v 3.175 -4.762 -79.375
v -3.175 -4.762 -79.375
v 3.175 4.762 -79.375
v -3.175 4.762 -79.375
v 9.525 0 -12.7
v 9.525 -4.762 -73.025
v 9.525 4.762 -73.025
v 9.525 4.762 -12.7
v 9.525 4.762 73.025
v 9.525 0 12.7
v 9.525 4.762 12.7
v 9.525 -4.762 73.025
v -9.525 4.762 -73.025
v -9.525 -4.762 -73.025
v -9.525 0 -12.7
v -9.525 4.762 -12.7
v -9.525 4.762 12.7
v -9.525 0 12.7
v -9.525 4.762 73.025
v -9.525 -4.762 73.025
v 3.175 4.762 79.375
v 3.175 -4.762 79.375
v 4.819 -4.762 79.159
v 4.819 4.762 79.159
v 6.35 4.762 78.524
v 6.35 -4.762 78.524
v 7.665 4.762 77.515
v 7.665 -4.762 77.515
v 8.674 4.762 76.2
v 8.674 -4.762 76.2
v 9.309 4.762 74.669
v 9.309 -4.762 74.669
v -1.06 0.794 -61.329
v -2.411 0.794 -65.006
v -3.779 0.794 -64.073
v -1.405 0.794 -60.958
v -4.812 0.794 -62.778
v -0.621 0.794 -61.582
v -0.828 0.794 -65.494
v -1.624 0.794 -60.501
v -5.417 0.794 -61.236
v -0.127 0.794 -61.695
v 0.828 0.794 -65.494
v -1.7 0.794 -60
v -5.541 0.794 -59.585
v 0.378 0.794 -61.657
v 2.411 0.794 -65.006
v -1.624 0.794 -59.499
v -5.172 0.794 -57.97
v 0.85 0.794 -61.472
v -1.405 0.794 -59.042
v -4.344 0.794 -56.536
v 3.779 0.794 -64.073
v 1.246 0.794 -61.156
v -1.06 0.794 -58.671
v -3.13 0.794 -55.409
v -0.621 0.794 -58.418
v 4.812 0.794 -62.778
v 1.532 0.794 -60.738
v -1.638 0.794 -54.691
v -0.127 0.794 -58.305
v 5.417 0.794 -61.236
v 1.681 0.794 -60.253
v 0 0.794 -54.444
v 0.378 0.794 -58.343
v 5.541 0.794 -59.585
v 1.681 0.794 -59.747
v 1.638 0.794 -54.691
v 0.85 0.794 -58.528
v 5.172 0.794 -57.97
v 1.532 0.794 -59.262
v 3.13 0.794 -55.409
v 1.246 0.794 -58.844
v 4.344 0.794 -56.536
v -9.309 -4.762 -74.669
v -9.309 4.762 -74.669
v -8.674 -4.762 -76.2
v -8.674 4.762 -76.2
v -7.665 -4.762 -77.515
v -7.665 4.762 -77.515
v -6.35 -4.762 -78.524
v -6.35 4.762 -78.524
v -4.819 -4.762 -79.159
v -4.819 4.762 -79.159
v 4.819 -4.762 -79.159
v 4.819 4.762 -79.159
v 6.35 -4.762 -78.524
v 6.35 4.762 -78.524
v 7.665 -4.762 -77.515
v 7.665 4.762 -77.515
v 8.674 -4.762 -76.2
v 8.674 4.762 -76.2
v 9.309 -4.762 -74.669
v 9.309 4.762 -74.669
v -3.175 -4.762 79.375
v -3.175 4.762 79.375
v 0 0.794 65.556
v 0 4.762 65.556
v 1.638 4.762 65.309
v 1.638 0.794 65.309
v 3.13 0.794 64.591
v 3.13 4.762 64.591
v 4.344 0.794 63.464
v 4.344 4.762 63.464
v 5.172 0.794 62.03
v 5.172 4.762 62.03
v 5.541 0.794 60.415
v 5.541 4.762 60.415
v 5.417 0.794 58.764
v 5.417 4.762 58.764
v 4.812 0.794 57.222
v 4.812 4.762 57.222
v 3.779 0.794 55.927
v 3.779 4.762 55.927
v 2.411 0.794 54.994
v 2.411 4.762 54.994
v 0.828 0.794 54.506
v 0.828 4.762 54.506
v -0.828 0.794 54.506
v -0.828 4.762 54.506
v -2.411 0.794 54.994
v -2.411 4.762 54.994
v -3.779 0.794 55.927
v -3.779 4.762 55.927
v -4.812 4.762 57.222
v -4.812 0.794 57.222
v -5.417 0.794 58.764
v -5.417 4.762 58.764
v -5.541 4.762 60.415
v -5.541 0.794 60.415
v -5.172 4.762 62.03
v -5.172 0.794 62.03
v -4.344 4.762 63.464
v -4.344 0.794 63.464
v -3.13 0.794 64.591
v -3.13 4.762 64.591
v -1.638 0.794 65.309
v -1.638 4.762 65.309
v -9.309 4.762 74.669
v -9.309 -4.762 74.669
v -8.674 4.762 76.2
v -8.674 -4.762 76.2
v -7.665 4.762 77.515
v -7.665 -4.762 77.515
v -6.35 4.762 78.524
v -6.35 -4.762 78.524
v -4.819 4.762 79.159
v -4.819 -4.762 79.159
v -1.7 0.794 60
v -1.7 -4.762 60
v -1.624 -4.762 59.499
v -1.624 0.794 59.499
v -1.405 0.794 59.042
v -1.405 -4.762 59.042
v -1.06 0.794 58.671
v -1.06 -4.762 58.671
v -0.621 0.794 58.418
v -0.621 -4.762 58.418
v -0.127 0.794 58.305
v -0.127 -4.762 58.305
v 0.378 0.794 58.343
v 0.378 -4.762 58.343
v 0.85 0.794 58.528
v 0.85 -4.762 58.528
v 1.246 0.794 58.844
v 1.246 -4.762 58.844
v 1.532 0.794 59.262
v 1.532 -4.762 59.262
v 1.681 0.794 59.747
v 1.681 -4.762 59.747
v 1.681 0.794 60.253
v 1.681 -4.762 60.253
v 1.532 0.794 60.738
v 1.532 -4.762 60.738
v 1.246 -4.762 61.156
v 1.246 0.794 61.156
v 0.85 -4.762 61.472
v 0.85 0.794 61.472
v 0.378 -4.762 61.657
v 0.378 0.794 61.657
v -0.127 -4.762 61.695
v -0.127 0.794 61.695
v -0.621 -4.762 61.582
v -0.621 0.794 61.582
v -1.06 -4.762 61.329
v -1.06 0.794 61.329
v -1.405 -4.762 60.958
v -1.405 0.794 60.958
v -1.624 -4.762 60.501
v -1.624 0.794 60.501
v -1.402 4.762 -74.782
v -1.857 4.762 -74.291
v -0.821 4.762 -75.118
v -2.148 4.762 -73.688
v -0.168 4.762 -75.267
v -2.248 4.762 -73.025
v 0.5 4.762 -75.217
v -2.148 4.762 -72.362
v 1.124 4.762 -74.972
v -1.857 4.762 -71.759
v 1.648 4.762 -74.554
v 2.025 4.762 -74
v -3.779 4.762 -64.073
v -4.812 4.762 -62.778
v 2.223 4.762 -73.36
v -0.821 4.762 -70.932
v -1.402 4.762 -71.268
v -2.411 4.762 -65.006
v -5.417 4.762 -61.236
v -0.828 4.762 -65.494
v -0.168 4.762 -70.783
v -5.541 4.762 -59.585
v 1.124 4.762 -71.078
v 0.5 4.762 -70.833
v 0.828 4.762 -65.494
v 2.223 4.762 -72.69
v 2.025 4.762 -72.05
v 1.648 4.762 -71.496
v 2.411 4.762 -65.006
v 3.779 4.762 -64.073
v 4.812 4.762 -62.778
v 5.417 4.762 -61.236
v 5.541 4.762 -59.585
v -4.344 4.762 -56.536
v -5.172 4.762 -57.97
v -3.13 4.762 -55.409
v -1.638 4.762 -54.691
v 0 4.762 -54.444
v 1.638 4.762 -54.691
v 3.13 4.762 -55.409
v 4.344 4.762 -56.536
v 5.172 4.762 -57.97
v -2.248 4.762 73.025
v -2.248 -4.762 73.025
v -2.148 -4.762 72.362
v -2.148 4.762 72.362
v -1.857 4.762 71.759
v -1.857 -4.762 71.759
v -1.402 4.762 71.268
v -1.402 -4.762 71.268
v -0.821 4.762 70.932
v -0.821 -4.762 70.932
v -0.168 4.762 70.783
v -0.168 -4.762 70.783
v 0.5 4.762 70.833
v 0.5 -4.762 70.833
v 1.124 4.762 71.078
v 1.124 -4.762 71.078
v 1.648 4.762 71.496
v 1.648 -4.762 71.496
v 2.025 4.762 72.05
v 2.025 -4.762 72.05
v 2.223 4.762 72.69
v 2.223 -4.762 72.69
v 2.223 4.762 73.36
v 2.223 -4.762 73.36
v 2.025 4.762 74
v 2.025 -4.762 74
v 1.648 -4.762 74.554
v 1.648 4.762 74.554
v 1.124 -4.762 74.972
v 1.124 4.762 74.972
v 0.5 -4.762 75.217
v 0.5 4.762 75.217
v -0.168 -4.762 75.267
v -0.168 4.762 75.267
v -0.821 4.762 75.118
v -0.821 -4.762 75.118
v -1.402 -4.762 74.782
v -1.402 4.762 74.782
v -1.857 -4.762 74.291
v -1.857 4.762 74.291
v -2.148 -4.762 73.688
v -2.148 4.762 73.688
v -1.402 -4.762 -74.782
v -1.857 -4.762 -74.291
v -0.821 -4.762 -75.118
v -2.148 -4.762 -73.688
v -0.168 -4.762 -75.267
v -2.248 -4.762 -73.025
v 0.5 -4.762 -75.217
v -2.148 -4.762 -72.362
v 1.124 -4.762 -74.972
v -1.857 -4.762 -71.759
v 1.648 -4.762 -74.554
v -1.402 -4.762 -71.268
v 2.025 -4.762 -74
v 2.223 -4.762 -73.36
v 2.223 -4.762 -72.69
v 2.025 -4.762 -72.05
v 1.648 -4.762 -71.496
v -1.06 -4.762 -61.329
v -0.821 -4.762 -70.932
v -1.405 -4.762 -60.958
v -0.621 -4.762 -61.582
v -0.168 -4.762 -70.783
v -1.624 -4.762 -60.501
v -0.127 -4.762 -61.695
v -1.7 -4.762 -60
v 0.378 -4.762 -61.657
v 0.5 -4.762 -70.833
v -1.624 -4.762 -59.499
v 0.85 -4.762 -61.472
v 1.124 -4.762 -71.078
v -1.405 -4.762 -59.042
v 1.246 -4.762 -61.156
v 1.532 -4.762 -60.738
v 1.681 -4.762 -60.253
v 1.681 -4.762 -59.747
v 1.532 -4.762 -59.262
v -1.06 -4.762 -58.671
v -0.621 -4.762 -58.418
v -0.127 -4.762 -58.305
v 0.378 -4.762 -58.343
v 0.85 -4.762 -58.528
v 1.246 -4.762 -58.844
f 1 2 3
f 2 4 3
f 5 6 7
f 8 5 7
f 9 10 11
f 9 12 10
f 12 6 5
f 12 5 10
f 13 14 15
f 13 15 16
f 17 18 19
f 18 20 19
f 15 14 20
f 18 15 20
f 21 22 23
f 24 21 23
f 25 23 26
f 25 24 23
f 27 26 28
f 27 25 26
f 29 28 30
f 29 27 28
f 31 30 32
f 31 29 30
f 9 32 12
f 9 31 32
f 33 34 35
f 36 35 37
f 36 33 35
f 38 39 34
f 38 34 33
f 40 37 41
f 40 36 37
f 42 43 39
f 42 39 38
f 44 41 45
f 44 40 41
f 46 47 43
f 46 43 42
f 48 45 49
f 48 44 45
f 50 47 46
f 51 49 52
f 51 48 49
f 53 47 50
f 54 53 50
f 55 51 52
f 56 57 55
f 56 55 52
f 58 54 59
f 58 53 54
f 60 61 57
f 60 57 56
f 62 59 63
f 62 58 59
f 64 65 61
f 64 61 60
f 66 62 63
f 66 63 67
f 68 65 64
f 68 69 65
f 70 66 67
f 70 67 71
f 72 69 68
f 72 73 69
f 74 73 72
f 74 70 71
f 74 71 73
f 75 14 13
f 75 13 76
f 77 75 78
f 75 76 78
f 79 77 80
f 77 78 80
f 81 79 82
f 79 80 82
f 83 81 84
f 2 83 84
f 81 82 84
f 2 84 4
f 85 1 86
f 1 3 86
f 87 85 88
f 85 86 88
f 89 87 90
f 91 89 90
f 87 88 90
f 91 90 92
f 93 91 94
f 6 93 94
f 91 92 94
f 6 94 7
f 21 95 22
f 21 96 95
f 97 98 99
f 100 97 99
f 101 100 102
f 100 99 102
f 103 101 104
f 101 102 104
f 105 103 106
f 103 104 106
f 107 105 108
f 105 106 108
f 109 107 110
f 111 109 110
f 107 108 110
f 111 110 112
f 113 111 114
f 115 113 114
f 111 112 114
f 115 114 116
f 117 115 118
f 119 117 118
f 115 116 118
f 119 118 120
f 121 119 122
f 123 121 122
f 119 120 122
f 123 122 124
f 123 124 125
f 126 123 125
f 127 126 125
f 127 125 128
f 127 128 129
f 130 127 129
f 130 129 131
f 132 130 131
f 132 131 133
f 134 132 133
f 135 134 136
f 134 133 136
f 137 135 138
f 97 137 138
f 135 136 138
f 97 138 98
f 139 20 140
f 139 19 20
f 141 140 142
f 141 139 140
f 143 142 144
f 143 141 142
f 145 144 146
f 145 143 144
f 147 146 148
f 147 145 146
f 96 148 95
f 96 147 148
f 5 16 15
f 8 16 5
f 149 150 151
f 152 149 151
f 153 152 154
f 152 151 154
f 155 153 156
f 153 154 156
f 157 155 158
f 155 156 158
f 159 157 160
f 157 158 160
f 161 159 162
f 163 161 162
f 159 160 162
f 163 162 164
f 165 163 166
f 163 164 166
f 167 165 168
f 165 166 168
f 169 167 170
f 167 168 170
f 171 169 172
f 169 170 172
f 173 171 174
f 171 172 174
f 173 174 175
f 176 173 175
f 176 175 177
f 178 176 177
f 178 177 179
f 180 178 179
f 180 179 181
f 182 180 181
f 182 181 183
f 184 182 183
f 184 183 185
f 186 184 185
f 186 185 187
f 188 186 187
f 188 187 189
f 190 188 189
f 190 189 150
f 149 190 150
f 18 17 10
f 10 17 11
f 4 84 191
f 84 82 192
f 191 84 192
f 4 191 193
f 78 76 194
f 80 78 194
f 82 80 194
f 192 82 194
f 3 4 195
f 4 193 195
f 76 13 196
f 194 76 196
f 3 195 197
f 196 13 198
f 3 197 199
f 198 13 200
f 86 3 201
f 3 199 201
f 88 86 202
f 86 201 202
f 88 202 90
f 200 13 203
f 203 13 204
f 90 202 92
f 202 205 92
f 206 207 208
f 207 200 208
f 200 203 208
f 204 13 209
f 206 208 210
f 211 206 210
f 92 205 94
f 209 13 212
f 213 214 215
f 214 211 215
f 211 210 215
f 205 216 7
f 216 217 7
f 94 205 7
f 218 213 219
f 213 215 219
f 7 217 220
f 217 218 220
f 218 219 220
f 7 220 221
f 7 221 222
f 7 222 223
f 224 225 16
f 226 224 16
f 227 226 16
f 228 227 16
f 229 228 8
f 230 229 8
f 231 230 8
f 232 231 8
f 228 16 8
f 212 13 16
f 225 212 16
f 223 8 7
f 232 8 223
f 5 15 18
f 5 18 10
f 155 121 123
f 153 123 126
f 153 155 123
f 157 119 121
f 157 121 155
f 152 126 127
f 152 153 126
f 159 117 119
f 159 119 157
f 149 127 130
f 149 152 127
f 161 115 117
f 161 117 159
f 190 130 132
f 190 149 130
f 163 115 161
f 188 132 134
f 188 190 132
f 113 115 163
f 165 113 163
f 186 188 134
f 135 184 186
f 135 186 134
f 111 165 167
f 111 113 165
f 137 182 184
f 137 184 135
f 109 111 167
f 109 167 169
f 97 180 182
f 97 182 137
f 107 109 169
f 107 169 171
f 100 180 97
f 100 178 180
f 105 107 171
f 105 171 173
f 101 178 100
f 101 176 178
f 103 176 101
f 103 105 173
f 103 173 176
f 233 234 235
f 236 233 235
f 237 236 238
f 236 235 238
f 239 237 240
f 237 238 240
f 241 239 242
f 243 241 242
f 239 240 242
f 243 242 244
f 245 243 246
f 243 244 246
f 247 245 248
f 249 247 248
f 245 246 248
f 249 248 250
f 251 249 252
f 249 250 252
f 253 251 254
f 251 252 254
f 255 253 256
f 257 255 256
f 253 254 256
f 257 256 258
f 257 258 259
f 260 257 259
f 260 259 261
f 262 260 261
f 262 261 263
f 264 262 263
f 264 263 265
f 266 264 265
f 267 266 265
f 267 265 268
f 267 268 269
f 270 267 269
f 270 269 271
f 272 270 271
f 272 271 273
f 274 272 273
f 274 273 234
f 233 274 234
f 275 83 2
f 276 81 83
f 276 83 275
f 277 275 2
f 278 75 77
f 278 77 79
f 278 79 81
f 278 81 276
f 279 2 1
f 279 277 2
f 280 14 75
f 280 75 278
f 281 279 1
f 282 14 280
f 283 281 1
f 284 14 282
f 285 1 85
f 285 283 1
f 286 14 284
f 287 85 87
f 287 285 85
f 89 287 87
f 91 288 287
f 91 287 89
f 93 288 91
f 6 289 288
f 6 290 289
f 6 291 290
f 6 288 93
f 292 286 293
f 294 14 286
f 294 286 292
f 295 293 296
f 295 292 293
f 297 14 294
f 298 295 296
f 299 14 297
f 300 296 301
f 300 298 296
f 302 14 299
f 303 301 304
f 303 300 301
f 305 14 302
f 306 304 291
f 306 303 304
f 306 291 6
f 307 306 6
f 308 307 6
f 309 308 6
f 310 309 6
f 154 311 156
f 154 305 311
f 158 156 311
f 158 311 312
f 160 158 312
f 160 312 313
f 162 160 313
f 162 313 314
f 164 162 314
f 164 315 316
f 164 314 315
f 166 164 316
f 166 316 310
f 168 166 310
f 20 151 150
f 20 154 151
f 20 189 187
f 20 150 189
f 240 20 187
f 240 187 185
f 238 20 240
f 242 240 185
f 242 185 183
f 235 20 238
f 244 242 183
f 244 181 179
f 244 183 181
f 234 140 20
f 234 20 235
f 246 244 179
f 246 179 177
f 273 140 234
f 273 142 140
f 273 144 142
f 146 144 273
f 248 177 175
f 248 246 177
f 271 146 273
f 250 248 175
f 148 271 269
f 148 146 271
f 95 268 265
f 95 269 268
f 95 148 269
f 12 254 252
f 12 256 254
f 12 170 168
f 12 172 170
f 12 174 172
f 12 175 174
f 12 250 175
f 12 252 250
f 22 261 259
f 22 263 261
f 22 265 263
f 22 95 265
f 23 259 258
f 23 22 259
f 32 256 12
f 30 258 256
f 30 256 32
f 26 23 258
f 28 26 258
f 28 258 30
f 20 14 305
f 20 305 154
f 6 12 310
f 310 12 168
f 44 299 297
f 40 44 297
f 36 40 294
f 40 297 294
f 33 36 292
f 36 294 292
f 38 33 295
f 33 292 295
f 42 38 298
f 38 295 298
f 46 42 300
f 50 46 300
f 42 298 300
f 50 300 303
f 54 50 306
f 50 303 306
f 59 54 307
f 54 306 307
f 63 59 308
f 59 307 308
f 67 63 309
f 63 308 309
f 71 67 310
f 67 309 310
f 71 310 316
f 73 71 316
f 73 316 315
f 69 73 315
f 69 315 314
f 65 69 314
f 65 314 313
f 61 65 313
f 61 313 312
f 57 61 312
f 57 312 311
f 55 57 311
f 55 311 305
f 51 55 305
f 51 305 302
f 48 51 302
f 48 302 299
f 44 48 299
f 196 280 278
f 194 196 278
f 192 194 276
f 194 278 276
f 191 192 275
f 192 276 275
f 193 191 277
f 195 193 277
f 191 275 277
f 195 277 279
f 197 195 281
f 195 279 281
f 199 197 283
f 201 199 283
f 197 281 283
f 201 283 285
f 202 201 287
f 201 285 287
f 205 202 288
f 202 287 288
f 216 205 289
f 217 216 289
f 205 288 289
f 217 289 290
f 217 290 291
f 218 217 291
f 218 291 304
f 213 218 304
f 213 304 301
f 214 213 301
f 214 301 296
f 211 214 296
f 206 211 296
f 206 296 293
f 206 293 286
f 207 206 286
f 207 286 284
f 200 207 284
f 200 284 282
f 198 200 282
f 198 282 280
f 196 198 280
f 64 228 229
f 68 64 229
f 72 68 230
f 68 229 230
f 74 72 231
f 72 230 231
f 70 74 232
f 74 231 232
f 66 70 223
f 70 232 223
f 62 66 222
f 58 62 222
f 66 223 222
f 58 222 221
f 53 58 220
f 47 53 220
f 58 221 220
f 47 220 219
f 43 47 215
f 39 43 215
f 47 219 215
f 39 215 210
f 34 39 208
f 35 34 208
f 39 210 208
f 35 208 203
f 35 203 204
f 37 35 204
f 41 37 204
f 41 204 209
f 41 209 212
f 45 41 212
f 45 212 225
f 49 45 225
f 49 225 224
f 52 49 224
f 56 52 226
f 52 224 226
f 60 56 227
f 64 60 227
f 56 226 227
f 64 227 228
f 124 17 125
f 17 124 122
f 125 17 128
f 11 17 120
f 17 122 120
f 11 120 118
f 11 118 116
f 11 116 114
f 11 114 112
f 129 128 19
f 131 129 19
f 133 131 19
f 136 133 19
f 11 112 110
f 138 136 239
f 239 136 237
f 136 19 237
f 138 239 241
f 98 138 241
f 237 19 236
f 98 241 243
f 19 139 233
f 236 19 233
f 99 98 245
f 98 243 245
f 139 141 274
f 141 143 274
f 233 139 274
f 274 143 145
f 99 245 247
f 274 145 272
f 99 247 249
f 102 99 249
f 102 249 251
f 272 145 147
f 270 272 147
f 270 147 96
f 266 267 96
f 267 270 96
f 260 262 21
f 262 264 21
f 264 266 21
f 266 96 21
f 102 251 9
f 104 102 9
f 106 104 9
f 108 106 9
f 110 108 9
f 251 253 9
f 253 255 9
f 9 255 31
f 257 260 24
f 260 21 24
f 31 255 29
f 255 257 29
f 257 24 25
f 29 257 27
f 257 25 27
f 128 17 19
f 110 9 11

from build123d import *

# Parameters (mm, degrees)
SKETCH1_W             = 19.05
SKETCH1_H             = 9.525
BOSS_EXTRUDE1_DEPTH   = 79.375
SKETCH2_W             = 19.05
SKETCH2_H             = 25.4
CUT_EXTRUDE1_DEPTH    = 4.7625
M3_CLEARANCE_HOLE1_D  = 3.4
SKETCH5_R             = 5.55625
CUT_EXTRUDE2_DEPTH    = 3.96875
F_8_CLEARANCE_HOLE1_D = 4.4958
FILLET1_R             = 6.35


with BuildPart() as part:
    # Sketch1 → Boss-Extrude1 (new, symmetric)
    with BuildSketch(Plane.XY):
        Rectangle(SKETCH1_W, SKETCH1_H)
    extrude(amount=BOSS_EXTRUDE1_DEPTH, both=True)

    # Sketch2 → Cut-Extrude1 (cut)
    with BuildSketch(Plane(origin=(0, 4.7625, 0), x_dir=(1, 0, 0), z_dir=(0, 1, 0))):
        Rectangle(SKETCH2_W, SKETCH2_H)
    extrude(amount=-CUT_EXTRUDE1_DEPTH, mode=Mode.SUBTRACT)

    # M3 Clearance Hole1 (through all)
    with Locations(Plane(origin=(0, 4.7625, 0), x_dir=(1, 0, 0), z_dir=(0, 1, 0))):
        with Locations((0, -60.000000015), (0, 60.000000015)):
            Hole(M3_CLEARANCE_HOLE1_D / 2)

    # Sketch5 → Cut-Extrude2 (cut)
    with BuildSketch(Plane(origin=(0, 4.7625, 0), x_dir=(1, 0, 0), z_dir=(0, 1, 0))):
        with Locations(Location((0, -60.000000015, 0), (0, 0, 270))):
            Circle(SKETCH5_R)
        with Locations(Location((0, 60.000000015, 0), (0, 0, 270))):
            Circle(SKETCH5_R)
    extrude(amount=-CUT_EXTRUDE2_DEPTH, mode=Mode.SUBTRACT)

    # #8 Clearance Hole1 (through all)
    with Locations(Plane(origin=(0, 4.7625, 0), x_dir=(1, 0, 0), z_dir=(0, 1, 0))):
        with Locations((0, -73.025), (0, 73.025)):
            Hole(F_8_CLEARANCE_HOLE1_D / 2)

    # Fillet1
    fillet1_edges = [part.edges().sort_by_distance(p)[0] for p in [
        (-9.525, 0, 79.375),
        (9.525, 0, 79.375),
        (-9.525, 0, -79.375),
        (9.525, 0, -79.375),
    ]]
    fillet(fillet1_edges, radius=FILLET1_R)


solid = part.part
